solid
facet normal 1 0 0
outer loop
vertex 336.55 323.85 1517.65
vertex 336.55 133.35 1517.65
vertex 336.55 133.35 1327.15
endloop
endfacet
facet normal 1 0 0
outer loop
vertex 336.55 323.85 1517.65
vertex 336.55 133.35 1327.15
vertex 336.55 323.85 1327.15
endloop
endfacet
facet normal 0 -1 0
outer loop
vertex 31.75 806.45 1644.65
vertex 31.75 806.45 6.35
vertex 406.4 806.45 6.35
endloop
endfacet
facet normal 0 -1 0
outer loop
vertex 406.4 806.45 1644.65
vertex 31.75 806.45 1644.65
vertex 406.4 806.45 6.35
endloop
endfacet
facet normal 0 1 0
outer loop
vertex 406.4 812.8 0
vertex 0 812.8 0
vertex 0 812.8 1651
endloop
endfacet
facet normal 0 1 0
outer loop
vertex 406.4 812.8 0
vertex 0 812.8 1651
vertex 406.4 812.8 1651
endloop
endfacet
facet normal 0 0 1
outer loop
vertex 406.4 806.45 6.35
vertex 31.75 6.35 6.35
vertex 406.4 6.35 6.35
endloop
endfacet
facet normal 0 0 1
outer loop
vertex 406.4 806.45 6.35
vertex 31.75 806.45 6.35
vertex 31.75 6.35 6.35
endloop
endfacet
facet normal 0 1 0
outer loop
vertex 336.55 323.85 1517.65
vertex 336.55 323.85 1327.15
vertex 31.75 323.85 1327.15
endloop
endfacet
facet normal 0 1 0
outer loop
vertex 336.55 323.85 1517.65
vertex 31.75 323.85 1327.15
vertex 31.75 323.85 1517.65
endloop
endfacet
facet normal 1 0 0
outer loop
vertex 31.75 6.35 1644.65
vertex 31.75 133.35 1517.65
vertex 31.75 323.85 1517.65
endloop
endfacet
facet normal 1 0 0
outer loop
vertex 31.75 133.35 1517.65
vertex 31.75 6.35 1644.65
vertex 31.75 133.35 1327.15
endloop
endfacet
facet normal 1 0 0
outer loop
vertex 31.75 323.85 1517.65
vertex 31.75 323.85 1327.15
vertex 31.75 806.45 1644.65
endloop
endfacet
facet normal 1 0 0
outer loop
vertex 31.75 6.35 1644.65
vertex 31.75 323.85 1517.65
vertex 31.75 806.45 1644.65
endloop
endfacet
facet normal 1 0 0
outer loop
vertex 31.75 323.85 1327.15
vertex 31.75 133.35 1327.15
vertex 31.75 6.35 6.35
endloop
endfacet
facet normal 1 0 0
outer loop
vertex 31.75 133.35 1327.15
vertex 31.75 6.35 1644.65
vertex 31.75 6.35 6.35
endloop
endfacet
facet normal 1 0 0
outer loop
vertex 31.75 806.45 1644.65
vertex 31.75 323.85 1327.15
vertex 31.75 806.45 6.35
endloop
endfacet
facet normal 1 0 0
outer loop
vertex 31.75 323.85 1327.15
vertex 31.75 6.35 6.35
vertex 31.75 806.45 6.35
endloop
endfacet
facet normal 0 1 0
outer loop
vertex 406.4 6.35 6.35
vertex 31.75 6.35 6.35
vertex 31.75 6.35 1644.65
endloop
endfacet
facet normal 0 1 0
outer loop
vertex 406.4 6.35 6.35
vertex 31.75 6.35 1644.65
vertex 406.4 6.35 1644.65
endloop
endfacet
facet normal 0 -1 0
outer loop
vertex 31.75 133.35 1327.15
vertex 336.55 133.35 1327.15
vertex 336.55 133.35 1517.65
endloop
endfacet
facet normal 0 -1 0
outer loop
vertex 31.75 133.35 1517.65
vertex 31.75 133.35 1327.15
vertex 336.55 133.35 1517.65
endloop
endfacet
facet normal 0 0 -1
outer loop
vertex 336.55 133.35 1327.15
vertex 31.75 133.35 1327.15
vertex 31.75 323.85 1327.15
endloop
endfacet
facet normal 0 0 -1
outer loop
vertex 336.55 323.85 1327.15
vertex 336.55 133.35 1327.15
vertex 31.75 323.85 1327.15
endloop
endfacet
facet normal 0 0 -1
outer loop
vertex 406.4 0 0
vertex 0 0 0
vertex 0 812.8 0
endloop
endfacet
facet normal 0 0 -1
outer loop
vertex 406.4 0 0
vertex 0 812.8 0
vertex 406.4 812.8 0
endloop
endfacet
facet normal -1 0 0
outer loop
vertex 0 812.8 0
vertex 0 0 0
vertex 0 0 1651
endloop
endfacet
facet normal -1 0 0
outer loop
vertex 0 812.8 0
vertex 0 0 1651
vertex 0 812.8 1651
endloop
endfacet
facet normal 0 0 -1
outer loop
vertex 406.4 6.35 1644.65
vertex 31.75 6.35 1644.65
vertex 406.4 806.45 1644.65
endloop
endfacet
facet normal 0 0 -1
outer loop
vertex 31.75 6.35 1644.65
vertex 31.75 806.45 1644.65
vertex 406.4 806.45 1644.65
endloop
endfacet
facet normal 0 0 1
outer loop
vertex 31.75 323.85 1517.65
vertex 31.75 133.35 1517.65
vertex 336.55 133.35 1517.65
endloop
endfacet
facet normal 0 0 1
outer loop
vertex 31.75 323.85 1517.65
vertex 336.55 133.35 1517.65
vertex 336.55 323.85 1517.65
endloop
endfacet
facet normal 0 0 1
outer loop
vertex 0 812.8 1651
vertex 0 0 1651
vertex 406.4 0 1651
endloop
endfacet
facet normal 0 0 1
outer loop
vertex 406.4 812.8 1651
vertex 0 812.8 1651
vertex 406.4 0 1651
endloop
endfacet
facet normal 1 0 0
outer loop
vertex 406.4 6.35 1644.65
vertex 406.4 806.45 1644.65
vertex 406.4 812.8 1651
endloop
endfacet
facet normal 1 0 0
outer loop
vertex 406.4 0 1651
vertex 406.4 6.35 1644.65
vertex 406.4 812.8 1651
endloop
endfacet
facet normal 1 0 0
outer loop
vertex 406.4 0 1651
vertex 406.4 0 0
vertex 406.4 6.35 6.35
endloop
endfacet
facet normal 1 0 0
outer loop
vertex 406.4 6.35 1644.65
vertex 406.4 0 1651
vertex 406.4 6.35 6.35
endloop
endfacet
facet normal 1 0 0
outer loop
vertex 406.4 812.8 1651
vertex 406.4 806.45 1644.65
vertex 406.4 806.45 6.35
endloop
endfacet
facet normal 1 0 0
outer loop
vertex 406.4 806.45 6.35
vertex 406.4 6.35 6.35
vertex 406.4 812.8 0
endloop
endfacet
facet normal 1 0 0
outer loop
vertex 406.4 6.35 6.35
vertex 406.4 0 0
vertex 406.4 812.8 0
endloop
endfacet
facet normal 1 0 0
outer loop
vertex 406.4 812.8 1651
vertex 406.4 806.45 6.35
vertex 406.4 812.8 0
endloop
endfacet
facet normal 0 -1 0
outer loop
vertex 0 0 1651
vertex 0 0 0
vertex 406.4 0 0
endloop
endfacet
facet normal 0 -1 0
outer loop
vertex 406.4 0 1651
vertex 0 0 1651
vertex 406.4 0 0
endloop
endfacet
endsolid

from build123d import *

# Parameters (mm, degrees)
F0_W     = 406.4
F0_H     = 812.8
F1_DEPTH = 1651
F2_T     = -6.35
F3_DEPTH = 25.4
F4_W     = 190.5
F4_H     = 190.5
F5_DEPTH = 304.8


with BuildPart() as f1:
    # F0 (on Top) → F1 (new body)
    with BuildSketch(Plane.XY):
        with Locations((203.2, 406.4)):
            Rectangle(F0_W, F0_H)
    extrude(amount=F1_DEPTH)

    # F2
    f2_openings = [f1.faces().sort_by_distance(p)[0] for p in [
        (406.4, 406.4, 825.5),
    ]]
    offset(amount=F2_T, openings=f2_openings)

    # F3 (add): a face of the model
    f3_faces = [f1.faces().sort_by_distance(p)[0] for p in [
        (6.35, 406.4, 825.5),
    ]]
    extrude(f3_faces, amount=F3_DEPTH)

    # F4 (on face) → F5 (join)
    with BuildSketch(Plane.YZ.offset(31.75)):
        with Locations((228.6, 1422.4)):
            Rectangle(F4_W, F4_H)
    extrude(amount=F5_DEPTH)


solid = f1.part
